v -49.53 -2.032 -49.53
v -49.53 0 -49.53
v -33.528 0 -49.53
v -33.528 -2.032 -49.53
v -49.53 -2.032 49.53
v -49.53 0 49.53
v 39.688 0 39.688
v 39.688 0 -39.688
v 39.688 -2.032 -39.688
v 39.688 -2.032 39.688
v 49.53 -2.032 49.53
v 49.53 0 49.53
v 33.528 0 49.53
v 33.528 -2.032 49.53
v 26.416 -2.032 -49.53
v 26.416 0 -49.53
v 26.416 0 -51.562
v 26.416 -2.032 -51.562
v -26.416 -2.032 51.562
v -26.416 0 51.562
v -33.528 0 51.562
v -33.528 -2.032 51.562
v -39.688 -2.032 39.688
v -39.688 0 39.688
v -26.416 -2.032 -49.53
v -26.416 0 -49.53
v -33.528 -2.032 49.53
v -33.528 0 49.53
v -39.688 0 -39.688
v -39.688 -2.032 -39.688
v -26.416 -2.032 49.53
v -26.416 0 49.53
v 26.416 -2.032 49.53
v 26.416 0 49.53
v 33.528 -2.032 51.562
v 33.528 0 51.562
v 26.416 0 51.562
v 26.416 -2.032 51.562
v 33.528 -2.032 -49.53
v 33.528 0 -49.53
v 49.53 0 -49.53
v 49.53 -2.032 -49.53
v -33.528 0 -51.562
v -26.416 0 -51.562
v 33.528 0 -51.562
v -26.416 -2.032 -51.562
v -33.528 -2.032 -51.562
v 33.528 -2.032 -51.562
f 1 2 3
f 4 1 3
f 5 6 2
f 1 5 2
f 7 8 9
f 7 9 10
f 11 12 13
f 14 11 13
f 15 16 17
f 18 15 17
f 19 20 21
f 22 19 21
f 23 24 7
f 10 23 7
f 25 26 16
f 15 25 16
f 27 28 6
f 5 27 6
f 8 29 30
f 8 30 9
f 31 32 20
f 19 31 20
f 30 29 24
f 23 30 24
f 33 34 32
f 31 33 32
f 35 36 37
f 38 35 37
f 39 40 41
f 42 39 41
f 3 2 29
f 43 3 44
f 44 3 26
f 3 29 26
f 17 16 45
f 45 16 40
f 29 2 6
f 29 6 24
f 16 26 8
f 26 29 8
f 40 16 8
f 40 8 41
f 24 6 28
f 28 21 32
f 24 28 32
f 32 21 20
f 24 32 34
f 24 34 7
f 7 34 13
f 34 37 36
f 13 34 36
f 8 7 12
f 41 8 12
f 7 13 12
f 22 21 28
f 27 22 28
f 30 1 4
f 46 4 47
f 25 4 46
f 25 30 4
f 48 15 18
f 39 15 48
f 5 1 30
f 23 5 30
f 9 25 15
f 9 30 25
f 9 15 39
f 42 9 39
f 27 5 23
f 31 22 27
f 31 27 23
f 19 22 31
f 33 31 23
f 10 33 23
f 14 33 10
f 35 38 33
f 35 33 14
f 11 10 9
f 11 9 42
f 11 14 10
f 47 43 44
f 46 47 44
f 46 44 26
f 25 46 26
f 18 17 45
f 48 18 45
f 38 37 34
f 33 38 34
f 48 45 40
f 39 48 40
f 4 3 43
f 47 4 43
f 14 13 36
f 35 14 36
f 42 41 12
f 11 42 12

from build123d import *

# Parameters (mm, degrees)
F0_W     = 79.375
F0_H     = 79.375
F1_DEPTH = 2.032


with BuildPart() as f1:
    # F0 (on Front) → F1 (new body)
    with BuildSketch(Plane.XZ):
        Polygon((-33.528, 49.53), (-49.53, 49.53), (-49.53, 0), (-49.53, -49.53), (-33.528, -49.53), (-33.528, -51.562), (-26.416, -51.562), (-26.416, -49.53), (26.416, -49.53), (26.416, -51.562), (33.528, -51.562), (33.528, -49.53), (49.53, -49.53), (49.53, 0), (49.53, 49.53), (33.528, 49.53), (33.528, 51.562), (26.416, 51.562), (26.416, 49.53), (-26.416, 49.53), (-26.416, 51.562), (-33.528, 51.562), align=None)
        Rectangle(F0_W, F0_H, mode=Mode.SUBTRACT)
    extrude(amount=F1_DEPTH)


solid = f1.part
